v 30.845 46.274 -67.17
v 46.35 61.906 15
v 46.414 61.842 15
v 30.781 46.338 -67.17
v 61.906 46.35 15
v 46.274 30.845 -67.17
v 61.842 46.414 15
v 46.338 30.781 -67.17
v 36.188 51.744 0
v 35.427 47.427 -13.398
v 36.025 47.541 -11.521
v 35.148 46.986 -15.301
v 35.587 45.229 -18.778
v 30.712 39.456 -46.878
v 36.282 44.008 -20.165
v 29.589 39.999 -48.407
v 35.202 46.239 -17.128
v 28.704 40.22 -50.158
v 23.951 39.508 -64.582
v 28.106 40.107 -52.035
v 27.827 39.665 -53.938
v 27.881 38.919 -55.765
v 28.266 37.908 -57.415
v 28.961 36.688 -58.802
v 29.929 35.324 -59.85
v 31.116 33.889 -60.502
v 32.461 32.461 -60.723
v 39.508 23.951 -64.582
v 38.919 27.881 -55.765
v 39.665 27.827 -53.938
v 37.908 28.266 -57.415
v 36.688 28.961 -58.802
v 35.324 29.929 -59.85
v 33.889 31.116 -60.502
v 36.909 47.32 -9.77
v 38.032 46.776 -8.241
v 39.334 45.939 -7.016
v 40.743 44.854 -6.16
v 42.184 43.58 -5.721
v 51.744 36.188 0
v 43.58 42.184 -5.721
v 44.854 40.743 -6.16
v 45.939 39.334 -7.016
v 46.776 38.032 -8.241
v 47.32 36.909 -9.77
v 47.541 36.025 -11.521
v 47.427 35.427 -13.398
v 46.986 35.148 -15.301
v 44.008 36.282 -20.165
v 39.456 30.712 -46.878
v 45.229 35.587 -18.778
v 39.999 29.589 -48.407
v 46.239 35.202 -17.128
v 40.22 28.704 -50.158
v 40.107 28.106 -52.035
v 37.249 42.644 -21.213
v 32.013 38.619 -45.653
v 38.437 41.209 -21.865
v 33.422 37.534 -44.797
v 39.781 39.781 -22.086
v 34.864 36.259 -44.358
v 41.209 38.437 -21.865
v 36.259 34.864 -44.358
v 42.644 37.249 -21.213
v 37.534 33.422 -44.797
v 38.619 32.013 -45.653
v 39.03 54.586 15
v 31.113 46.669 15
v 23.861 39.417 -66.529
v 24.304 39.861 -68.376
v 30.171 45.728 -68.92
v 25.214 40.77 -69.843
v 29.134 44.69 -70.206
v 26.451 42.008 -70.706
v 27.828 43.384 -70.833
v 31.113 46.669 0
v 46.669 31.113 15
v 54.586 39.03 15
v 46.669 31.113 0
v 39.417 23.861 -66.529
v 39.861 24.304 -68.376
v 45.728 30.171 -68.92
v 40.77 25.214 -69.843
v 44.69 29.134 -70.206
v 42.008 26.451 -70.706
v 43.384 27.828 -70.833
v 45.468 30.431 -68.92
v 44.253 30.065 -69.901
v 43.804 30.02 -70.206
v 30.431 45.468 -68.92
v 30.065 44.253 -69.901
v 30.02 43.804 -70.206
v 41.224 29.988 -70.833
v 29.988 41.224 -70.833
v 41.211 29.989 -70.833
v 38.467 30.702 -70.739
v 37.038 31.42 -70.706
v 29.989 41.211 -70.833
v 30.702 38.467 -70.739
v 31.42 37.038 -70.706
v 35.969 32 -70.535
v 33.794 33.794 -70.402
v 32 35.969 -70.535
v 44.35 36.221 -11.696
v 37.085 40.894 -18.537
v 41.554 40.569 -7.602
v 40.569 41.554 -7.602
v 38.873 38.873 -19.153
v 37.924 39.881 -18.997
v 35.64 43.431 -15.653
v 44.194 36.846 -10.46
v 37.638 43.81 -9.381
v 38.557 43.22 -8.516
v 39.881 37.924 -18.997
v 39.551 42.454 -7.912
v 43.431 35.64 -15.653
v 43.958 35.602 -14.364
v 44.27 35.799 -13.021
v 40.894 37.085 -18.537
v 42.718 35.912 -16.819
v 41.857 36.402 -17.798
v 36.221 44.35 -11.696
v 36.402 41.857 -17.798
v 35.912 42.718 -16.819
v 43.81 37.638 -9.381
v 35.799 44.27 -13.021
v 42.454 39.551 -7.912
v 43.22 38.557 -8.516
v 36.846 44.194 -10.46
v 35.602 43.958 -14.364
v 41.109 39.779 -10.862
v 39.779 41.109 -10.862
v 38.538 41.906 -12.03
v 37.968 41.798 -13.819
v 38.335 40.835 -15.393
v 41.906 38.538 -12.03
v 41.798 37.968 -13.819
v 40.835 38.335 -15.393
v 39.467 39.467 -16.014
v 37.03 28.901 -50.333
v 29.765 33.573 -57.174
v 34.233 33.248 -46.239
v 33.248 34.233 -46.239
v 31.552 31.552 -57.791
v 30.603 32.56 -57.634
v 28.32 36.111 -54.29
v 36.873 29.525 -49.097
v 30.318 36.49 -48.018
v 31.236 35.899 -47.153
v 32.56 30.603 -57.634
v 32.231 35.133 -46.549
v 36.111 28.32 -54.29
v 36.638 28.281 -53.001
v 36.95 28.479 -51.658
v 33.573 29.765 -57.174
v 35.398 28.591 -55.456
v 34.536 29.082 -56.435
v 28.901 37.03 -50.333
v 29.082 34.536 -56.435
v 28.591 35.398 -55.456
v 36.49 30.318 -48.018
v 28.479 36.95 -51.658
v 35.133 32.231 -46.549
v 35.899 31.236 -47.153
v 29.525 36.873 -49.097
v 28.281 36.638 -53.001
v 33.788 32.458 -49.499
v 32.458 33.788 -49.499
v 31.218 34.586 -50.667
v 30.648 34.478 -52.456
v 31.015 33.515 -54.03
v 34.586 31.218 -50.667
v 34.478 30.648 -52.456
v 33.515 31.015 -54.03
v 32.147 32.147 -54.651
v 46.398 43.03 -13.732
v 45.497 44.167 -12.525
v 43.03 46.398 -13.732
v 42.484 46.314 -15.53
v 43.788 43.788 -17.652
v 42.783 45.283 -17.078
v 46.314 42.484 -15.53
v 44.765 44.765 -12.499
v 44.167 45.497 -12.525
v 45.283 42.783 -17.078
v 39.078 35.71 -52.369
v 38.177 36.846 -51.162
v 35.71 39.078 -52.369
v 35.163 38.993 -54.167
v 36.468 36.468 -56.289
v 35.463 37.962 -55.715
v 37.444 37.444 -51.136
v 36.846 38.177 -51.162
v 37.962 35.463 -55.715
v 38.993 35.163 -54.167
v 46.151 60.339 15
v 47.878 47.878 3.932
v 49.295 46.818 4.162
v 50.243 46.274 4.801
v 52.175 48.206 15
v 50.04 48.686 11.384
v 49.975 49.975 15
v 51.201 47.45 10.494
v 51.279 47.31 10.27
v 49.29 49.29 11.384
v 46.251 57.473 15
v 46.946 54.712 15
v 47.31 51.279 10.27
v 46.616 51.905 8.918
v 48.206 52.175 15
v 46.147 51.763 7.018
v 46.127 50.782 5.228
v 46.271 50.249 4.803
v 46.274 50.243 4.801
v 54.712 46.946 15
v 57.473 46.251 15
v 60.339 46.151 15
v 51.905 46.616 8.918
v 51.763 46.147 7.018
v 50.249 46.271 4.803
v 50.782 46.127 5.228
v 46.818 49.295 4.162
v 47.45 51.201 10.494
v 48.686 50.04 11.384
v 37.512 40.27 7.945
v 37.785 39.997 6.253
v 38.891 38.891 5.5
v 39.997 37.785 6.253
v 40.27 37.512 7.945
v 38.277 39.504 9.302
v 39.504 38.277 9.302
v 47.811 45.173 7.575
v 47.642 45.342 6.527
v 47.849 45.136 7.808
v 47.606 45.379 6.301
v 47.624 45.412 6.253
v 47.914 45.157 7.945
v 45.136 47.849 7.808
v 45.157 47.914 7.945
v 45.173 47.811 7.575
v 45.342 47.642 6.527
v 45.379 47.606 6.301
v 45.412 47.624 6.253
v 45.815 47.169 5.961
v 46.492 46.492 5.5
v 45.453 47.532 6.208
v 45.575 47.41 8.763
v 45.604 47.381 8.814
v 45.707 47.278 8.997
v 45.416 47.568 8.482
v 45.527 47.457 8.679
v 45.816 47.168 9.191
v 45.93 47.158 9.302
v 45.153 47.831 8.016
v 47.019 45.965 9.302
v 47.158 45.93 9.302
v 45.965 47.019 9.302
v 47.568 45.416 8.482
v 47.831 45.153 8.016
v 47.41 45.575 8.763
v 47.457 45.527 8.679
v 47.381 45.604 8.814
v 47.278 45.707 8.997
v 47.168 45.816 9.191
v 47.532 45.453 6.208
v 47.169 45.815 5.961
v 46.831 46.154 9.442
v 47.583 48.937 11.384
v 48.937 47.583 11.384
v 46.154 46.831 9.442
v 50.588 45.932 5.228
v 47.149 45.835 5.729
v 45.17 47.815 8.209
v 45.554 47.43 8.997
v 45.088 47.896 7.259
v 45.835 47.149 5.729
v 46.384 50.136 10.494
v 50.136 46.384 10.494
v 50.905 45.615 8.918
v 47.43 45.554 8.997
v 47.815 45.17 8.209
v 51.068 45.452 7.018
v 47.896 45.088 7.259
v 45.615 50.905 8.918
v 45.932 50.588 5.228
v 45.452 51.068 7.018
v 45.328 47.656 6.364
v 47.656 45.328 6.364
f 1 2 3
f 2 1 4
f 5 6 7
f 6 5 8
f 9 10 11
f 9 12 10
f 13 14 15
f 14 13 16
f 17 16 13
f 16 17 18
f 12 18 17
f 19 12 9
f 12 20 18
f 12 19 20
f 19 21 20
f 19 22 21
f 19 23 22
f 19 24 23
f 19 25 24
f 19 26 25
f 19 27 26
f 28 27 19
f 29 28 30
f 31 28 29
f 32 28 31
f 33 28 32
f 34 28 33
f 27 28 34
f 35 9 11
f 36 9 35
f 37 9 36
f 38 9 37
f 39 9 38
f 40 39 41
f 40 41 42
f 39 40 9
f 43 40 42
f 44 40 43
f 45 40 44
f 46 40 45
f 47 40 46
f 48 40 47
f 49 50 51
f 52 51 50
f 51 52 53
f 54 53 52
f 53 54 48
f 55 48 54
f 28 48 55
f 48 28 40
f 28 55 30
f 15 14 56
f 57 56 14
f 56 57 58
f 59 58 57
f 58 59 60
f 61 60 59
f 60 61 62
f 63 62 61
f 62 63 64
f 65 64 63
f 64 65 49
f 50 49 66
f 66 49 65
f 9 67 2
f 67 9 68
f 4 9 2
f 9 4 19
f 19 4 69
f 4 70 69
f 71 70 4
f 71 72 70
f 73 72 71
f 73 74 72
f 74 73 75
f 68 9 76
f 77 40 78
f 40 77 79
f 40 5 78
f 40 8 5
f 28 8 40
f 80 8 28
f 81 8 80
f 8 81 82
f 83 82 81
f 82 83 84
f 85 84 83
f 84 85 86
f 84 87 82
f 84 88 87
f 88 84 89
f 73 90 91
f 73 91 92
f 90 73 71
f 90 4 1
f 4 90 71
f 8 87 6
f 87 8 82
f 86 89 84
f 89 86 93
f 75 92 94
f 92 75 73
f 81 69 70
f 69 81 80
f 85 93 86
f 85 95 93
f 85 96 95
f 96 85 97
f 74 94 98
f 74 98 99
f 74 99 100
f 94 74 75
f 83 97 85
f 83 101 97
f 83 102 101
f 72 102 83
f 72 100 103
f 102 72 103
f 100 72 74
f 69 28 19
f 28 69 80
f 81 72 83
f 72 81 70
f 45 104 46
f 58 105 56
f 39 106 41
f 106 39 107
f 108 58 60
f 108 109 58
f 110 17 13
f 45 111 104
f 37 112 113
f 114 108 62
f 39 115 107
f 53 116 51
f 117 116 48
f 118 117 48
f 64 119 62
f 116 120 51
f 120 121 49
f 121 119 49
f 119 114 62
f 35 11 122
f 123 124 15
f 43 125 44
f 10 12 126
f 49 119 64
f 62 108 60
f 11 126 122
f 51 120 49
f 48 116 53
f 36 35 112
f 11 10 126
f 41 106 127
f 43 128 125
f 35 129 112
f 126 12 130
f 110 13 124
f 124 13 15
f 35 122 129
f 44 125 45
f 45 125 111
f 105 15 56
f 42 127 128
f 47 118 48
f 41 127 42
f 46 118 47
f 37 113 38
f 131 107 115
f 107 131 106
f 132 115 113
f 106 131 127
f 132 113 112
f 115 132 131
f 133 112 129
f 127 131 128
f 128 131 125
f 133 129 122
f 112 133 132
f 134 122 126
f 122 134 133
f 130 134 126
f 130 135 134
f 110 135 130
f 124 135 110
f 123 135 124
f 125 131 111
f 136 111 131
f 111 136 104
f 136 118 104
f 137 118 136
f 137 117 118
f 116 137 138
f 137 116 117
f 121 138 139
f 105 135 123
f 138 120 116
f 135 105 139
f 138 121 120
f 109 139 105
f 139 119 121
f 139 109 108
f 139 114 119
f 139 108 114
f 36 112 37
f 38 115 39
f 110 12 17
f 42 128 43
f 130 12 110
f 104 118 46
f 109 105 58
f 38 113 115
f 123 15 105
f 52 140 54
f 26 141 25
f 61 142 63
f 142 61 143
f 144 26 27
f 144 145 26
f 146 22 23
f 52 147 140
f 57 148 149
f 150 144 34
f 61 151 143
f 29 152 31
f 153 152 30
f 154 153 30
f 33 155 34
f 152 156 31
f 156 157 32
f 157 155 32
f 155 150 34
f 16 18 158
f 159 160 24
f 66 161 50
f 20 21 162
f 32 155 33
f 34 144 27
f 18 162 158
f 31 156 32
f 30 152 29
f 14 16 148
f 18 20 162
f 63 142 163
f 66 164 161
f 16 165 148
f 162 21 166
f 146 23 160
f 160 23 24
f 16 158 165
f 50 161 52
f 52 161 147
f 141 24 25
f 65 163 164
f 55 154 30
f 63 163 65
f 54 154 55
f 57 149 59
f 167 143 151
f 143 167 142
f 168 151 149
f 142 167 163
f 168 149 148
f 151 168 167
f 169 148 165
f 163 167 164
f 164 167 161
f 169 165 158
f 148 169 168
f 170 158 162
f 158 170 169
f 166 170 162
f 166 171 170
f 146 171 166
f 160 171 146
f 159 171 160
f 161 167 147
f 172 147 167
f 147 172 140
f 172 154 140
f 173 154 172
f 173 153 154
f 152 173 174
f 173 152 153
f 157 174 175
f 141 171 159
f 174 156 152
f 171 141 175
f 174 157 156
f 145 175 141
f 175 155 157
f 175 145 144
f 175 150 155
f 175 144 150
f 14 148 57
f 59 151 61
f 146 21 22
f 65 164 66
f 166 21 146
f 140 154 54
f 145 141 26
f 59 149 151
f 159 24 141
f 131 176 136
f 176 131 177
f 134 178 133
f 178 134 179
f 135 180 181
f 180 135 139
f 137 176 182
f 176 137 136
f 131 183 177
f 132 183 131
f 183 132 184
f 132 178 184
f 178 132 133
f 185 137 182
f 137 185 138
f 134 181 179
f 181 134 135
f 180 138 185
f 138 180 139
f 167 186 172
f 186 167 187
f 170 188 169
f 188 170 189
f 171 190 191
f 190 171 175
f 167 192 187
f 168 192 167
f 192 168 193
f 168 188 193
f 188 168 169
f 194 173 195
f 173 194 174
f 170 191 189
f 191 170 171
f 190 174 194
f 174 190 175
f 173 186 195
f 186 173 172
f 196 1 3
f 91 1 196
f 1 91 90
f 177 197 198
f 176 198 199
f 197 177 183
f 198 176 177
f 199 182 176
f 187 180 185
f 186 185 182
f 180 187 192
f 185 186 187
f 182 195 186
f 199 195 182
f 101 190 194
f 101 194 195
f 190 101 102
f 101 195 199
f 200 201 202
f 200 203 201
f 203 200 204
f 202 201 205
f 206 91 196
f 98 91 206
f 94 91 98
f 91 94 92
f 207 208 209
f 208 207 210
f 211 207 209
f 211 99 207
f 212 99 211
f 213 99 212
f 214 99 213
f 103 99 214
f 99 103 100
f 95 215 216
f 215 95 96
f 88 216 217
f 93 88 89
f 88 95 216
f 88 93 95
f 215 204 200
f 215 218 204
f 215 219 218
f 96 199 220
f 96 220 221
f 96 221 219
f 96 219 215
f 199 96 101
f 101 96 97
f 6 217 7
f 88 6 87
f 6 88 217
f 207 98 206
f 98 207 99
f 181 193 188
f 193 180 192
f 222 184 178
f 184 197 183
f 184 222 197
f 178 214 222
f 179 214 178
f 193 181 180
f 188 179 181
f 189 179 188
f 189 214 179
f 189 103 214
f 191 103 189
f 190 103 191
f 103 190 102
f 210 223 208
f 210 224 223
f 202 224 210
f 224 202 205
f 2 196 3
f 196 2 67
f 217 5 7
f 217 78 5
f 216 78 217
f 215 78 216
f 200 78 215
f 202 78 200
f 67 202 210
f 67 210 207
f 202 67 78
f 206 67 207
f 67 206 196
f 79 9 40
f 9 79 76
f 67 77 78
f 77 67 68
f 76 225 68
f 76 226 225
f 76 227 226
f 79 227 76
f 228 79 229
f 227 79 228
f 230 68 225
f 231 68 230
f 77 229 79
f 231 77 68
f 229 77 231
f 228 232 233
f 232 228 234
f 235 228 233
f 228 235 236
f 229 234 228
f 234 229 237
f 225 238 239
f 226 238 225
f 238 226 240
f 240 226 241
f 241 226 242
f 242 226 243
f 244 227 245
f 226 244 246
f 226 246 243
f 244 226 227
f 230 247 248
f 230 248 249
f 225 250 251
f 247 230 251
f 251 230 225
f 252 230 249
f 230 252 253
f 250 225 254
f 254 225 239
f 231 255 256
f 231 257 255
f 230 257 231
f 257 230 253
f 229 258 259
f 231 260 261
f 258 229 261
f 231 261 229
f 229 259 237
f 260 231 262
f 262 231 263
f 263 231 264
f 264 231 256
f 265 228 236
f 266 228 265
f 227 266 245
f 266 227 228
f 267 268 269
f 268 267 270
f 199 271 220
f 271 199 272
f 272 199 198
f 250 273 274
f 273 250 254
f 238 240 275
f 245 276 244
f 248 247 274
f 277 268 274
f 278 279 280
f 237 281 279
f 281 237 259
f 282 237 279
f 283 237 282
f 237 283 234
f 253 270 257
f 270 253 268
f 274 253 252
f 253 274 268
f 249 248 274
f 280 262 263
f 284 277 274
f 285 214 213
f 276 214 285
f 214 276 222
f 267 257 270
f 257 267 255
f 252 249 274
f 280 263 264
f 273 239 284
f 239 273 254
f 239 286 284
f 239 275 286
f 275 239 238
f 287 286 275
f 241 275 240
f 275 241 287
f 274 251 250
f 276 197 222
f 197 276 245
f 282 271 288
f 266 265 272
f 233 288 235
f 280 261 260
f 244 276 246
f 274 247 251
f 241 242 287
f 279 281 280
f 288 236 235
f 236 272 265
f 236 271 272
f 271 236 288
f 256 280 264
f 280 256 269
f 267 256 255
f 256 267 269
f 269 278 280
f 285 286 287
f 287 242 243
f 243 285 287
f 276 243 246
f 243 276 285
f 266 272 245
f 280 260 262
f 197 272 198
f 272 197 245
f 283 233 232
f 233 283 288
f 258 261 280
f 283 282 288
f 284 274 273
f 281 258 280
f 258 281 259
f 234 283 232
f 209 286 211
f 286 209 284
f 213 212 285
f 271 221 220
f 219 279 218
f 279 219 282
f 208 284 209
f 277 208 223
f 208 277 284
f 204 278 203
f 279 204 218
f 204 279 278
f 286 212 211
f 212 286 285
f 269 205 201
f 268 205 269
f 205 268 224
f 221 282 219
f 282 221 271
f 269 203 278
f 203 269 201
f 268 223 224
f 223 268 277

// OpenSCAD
// sun_mount.scad
// Element mocujący Słońca - DRUKOWAĆ OSOBNO
// Łączy się z podstawą (sun.scad) poprzez wypustki/wgłębienia

// ===== Parametry =====
mount_angle = 45;
mount_gap = 12;
mount_width = 22;
mount_depth = 10;
mount_height = 90;
mount_tilt = 15;
mount_concave_r = 13.5;
mount_inner_boss_r = 6;
mount_inner_boss_base_r = 8.5;
mount_inner_boss_len = 2;
mount_margin_top = 15;
mount_r_round = mount_depth / 2;
mount_H = (mount_height - mount_depth * sin(mount_tilt)) / cos(mount_tilt);
mount_dish_axis_x = mount_depth + sqrt(mount_concave_r*mount_concave_r - (mount_width/2)*(mount_width/2));

base_thickness = 15;

// Parametry otworu montażowego
mounting_hole_diameter = 5.5;
mount_hole_z1 = -33;
mount_hole_z2 = -73;

// Parametry otworu przechodzącego przez model
base_diameter = 110;
base_radius = base_diameter / 2;

// Parametry zagłębienia stożkowego na otwór przechodzący
countersink_diameter = 8;
countersink_radius = countersink_diameter / 2;
countersink_depth = 2.5;

// Kolory
color_mount = [0.7, 0.7, 0.7];

// ===== Moduły z mount_fill =====
// Część mount_fill z elementem mocującym (za pionowym cięciem)
module mount_fill_mount() {
    cut_x = -12;
    top_z = 0;
    bot_z = -base_thickness;
    eps = 0.1;
    overlap = 3;

    intersection() {
        hull() {
            translate([-mount_gap - overlap, -mount_width/2, top_z - eps])
                cube([mount_gap + overlap + 0.01, mount_width, eps]);
            translate([-mount_gap - overlap, -mount_width/2, bot_z])
                cube([(bot_z * tan(mount_tilt)) + mount_gap + overlap + 0.01, mount_width, eps]);
        }
        // Ograniczyć do x >= cut_x (od cut_x do 0)
        translate([cut_x, -100, bot_z])
            cube([-cut_x + 1, 200, mount_gap + overlap + 100]);
    }
}

// ===== Moduły pomocnicze =====
module mount_inner_boss(z) {
    translate([-mount_inner_boss_len, 0, z]) rotate([0, 90, 0])
        cylinder(h = mount_inner_boss_len, r1 = mount_inner_boss_r, r2 = mount_inner_boss_base_r);
}

module mount_screw_hole(z) {
    translate([0, 0, z]) rotate([0, 90, 0]) {
        translate([0, 0, -(mount_inner_boss_len + 2)])
            cylinder(h = mount_inner_boss_len + 32, r = mounting_hole_diameter / 2);
    }
}

module mounting_holes() {
    mount_screw_hole(mount_hole_z1);
    mount_screw_hole(mount_hole_z2);
}

// ===== Graniastosłup trójkątny (wgłębienie) - 10% większy niż wypustka =====
module triangular_prism_cavity(y_center, z_min, z_max) {
    prism_width = 3.3;    // 3mm * 1.1
    prism_depth = 2.2;    // 2mm * 1.1

    polyhedron(
        points = [
            [-12, y_center, z_min],
            [-12, y_center + prism_width, z_min],
            [-12, y_center + prism_width/2, z_max],
            [-12 + prism_depth, y_center, z_min],
            [-12 + prism_depth, y_center + prism_width, z_min],
            [-12 + prism_depth, y_center + prism_width/2, z_max],
        ],
        faces = [
            [0, 1, 2],        // przód (x=-12)
            [5, 4, 3],        // tył
            [0, 1, 4, 3],     // dół
            [1, 2, 5, 4],     // bok 1
            [2, 0, 3, 5],     // bok 2
        ]
    );
}

// ===== ELEMENT MOCUJĄCY - GŁÓWNA BRYŁA =====
color(color_mount) {
    difference() {
        union() {
            // Główne ciało elementu mocującego
            translate([0, 0, base_thickness])
                rotate([0, 0, mount_angle])
                    translate([base_radius + mount_gap, 0, 3]) {
                        rotate([0, mount_tilt, 0]) {
                            intersection() {
                                difference() {
                                    union() {
                                        // Główne ciało
                                        translate([0, -mount_width/2, -mount_H + mount_r_round])
                                            cube([mount_depth, mount_width, (mount_H - mount_r_round) + mount_margin_top]);

                                        // Zaokrąglenie
                                        translate([mount_depth/2, 0, -mount_H + mount_r_round])
                                            rotate([-90, 0, 0])
                                            cylinder(h = mount_width, r = mount_r_round, center = true);

                                        // Wysepki wzmacniające
                                        mount_inner_boss(mount_hole_z1);
                                        mount_inner_boss(mount_hole_z2);
                                    }

                                    // Wklęsła ściana
                                    translate([mount_dish_axis_x, 0, -mount_H - 20])
                                        cylinder(h = mount_H + mount_margin_top + 40, r = mount_concave_r);

                                    // Otwory montażowe
                                    mounting_holes();
                                }

                                // Przycięcie
                                rotate(15, [0, -1, 0])
                                    translate([-1000, -1000, -3003])
                                        cube([2000, 2000, 3000]);
                            }
                        } 
                    }

            // Część łącznika z elementem
            translate([0, 0, base_thickness])
                rotate([0, 0, mount_angle])
                    translate([base_radius + mount_gap, 0, 0]) {
                        mount_fill_mount();
                    }
        }

        // Otwór 4mm przechodzący poziomo wzdłuż osi X przez element mocujący
        // Na tej samej wysokości jak w sun.scad
        translate([0, 0, base_thickness / 2])
            rotate([0, 0, mount_angle])
                translate([base_radius + mount_gap, 0, 0])
                    rotate([0, 90, 0])
                    cylinder(h = 500, r = 2, center = true);

        // Zagłębienie stożkowe na otwór przechodzący (od strony wklęsłej)
        translate([0, 0, base_thickness / 2])
            rotate([0, 0, mount_angle])
                translate([base_radius + mount_gap, 0, 0])
                    rotate([0, 90, 0])
                    cylinder(h = countersink_depth, r1 = 2, r2 = countersink_radius, center = true);

        // Cylindryczny otwór o średnicy 8mm w elemencie mocującym (od strony wklęsłej)
        translate([0, 0, base_thickness / 2])
            rotate([0, 0, mount_angle])
                translate([base_radius + mount_gap+countersink_depth/2, 0, 0])
                    rotate([0, 90, 0])
                    cylinder(h = countersink_depth*2, r = countersink_radius);

        // Wgłębienia pasujące do wypustek (o 10% większe)
        translate([0, 0, base_thickness])
            rotate([0, 0, mount_angle])
            translate([base_radius + mount_gap, 0, 0]) {
                triangular_prism_cavity(-mount_width/4 - 1, -base_thickness, 0);
                triangular_prism_cavity(mount_width/4 - 1, -base_thickness, 0);
            }
    }
}
